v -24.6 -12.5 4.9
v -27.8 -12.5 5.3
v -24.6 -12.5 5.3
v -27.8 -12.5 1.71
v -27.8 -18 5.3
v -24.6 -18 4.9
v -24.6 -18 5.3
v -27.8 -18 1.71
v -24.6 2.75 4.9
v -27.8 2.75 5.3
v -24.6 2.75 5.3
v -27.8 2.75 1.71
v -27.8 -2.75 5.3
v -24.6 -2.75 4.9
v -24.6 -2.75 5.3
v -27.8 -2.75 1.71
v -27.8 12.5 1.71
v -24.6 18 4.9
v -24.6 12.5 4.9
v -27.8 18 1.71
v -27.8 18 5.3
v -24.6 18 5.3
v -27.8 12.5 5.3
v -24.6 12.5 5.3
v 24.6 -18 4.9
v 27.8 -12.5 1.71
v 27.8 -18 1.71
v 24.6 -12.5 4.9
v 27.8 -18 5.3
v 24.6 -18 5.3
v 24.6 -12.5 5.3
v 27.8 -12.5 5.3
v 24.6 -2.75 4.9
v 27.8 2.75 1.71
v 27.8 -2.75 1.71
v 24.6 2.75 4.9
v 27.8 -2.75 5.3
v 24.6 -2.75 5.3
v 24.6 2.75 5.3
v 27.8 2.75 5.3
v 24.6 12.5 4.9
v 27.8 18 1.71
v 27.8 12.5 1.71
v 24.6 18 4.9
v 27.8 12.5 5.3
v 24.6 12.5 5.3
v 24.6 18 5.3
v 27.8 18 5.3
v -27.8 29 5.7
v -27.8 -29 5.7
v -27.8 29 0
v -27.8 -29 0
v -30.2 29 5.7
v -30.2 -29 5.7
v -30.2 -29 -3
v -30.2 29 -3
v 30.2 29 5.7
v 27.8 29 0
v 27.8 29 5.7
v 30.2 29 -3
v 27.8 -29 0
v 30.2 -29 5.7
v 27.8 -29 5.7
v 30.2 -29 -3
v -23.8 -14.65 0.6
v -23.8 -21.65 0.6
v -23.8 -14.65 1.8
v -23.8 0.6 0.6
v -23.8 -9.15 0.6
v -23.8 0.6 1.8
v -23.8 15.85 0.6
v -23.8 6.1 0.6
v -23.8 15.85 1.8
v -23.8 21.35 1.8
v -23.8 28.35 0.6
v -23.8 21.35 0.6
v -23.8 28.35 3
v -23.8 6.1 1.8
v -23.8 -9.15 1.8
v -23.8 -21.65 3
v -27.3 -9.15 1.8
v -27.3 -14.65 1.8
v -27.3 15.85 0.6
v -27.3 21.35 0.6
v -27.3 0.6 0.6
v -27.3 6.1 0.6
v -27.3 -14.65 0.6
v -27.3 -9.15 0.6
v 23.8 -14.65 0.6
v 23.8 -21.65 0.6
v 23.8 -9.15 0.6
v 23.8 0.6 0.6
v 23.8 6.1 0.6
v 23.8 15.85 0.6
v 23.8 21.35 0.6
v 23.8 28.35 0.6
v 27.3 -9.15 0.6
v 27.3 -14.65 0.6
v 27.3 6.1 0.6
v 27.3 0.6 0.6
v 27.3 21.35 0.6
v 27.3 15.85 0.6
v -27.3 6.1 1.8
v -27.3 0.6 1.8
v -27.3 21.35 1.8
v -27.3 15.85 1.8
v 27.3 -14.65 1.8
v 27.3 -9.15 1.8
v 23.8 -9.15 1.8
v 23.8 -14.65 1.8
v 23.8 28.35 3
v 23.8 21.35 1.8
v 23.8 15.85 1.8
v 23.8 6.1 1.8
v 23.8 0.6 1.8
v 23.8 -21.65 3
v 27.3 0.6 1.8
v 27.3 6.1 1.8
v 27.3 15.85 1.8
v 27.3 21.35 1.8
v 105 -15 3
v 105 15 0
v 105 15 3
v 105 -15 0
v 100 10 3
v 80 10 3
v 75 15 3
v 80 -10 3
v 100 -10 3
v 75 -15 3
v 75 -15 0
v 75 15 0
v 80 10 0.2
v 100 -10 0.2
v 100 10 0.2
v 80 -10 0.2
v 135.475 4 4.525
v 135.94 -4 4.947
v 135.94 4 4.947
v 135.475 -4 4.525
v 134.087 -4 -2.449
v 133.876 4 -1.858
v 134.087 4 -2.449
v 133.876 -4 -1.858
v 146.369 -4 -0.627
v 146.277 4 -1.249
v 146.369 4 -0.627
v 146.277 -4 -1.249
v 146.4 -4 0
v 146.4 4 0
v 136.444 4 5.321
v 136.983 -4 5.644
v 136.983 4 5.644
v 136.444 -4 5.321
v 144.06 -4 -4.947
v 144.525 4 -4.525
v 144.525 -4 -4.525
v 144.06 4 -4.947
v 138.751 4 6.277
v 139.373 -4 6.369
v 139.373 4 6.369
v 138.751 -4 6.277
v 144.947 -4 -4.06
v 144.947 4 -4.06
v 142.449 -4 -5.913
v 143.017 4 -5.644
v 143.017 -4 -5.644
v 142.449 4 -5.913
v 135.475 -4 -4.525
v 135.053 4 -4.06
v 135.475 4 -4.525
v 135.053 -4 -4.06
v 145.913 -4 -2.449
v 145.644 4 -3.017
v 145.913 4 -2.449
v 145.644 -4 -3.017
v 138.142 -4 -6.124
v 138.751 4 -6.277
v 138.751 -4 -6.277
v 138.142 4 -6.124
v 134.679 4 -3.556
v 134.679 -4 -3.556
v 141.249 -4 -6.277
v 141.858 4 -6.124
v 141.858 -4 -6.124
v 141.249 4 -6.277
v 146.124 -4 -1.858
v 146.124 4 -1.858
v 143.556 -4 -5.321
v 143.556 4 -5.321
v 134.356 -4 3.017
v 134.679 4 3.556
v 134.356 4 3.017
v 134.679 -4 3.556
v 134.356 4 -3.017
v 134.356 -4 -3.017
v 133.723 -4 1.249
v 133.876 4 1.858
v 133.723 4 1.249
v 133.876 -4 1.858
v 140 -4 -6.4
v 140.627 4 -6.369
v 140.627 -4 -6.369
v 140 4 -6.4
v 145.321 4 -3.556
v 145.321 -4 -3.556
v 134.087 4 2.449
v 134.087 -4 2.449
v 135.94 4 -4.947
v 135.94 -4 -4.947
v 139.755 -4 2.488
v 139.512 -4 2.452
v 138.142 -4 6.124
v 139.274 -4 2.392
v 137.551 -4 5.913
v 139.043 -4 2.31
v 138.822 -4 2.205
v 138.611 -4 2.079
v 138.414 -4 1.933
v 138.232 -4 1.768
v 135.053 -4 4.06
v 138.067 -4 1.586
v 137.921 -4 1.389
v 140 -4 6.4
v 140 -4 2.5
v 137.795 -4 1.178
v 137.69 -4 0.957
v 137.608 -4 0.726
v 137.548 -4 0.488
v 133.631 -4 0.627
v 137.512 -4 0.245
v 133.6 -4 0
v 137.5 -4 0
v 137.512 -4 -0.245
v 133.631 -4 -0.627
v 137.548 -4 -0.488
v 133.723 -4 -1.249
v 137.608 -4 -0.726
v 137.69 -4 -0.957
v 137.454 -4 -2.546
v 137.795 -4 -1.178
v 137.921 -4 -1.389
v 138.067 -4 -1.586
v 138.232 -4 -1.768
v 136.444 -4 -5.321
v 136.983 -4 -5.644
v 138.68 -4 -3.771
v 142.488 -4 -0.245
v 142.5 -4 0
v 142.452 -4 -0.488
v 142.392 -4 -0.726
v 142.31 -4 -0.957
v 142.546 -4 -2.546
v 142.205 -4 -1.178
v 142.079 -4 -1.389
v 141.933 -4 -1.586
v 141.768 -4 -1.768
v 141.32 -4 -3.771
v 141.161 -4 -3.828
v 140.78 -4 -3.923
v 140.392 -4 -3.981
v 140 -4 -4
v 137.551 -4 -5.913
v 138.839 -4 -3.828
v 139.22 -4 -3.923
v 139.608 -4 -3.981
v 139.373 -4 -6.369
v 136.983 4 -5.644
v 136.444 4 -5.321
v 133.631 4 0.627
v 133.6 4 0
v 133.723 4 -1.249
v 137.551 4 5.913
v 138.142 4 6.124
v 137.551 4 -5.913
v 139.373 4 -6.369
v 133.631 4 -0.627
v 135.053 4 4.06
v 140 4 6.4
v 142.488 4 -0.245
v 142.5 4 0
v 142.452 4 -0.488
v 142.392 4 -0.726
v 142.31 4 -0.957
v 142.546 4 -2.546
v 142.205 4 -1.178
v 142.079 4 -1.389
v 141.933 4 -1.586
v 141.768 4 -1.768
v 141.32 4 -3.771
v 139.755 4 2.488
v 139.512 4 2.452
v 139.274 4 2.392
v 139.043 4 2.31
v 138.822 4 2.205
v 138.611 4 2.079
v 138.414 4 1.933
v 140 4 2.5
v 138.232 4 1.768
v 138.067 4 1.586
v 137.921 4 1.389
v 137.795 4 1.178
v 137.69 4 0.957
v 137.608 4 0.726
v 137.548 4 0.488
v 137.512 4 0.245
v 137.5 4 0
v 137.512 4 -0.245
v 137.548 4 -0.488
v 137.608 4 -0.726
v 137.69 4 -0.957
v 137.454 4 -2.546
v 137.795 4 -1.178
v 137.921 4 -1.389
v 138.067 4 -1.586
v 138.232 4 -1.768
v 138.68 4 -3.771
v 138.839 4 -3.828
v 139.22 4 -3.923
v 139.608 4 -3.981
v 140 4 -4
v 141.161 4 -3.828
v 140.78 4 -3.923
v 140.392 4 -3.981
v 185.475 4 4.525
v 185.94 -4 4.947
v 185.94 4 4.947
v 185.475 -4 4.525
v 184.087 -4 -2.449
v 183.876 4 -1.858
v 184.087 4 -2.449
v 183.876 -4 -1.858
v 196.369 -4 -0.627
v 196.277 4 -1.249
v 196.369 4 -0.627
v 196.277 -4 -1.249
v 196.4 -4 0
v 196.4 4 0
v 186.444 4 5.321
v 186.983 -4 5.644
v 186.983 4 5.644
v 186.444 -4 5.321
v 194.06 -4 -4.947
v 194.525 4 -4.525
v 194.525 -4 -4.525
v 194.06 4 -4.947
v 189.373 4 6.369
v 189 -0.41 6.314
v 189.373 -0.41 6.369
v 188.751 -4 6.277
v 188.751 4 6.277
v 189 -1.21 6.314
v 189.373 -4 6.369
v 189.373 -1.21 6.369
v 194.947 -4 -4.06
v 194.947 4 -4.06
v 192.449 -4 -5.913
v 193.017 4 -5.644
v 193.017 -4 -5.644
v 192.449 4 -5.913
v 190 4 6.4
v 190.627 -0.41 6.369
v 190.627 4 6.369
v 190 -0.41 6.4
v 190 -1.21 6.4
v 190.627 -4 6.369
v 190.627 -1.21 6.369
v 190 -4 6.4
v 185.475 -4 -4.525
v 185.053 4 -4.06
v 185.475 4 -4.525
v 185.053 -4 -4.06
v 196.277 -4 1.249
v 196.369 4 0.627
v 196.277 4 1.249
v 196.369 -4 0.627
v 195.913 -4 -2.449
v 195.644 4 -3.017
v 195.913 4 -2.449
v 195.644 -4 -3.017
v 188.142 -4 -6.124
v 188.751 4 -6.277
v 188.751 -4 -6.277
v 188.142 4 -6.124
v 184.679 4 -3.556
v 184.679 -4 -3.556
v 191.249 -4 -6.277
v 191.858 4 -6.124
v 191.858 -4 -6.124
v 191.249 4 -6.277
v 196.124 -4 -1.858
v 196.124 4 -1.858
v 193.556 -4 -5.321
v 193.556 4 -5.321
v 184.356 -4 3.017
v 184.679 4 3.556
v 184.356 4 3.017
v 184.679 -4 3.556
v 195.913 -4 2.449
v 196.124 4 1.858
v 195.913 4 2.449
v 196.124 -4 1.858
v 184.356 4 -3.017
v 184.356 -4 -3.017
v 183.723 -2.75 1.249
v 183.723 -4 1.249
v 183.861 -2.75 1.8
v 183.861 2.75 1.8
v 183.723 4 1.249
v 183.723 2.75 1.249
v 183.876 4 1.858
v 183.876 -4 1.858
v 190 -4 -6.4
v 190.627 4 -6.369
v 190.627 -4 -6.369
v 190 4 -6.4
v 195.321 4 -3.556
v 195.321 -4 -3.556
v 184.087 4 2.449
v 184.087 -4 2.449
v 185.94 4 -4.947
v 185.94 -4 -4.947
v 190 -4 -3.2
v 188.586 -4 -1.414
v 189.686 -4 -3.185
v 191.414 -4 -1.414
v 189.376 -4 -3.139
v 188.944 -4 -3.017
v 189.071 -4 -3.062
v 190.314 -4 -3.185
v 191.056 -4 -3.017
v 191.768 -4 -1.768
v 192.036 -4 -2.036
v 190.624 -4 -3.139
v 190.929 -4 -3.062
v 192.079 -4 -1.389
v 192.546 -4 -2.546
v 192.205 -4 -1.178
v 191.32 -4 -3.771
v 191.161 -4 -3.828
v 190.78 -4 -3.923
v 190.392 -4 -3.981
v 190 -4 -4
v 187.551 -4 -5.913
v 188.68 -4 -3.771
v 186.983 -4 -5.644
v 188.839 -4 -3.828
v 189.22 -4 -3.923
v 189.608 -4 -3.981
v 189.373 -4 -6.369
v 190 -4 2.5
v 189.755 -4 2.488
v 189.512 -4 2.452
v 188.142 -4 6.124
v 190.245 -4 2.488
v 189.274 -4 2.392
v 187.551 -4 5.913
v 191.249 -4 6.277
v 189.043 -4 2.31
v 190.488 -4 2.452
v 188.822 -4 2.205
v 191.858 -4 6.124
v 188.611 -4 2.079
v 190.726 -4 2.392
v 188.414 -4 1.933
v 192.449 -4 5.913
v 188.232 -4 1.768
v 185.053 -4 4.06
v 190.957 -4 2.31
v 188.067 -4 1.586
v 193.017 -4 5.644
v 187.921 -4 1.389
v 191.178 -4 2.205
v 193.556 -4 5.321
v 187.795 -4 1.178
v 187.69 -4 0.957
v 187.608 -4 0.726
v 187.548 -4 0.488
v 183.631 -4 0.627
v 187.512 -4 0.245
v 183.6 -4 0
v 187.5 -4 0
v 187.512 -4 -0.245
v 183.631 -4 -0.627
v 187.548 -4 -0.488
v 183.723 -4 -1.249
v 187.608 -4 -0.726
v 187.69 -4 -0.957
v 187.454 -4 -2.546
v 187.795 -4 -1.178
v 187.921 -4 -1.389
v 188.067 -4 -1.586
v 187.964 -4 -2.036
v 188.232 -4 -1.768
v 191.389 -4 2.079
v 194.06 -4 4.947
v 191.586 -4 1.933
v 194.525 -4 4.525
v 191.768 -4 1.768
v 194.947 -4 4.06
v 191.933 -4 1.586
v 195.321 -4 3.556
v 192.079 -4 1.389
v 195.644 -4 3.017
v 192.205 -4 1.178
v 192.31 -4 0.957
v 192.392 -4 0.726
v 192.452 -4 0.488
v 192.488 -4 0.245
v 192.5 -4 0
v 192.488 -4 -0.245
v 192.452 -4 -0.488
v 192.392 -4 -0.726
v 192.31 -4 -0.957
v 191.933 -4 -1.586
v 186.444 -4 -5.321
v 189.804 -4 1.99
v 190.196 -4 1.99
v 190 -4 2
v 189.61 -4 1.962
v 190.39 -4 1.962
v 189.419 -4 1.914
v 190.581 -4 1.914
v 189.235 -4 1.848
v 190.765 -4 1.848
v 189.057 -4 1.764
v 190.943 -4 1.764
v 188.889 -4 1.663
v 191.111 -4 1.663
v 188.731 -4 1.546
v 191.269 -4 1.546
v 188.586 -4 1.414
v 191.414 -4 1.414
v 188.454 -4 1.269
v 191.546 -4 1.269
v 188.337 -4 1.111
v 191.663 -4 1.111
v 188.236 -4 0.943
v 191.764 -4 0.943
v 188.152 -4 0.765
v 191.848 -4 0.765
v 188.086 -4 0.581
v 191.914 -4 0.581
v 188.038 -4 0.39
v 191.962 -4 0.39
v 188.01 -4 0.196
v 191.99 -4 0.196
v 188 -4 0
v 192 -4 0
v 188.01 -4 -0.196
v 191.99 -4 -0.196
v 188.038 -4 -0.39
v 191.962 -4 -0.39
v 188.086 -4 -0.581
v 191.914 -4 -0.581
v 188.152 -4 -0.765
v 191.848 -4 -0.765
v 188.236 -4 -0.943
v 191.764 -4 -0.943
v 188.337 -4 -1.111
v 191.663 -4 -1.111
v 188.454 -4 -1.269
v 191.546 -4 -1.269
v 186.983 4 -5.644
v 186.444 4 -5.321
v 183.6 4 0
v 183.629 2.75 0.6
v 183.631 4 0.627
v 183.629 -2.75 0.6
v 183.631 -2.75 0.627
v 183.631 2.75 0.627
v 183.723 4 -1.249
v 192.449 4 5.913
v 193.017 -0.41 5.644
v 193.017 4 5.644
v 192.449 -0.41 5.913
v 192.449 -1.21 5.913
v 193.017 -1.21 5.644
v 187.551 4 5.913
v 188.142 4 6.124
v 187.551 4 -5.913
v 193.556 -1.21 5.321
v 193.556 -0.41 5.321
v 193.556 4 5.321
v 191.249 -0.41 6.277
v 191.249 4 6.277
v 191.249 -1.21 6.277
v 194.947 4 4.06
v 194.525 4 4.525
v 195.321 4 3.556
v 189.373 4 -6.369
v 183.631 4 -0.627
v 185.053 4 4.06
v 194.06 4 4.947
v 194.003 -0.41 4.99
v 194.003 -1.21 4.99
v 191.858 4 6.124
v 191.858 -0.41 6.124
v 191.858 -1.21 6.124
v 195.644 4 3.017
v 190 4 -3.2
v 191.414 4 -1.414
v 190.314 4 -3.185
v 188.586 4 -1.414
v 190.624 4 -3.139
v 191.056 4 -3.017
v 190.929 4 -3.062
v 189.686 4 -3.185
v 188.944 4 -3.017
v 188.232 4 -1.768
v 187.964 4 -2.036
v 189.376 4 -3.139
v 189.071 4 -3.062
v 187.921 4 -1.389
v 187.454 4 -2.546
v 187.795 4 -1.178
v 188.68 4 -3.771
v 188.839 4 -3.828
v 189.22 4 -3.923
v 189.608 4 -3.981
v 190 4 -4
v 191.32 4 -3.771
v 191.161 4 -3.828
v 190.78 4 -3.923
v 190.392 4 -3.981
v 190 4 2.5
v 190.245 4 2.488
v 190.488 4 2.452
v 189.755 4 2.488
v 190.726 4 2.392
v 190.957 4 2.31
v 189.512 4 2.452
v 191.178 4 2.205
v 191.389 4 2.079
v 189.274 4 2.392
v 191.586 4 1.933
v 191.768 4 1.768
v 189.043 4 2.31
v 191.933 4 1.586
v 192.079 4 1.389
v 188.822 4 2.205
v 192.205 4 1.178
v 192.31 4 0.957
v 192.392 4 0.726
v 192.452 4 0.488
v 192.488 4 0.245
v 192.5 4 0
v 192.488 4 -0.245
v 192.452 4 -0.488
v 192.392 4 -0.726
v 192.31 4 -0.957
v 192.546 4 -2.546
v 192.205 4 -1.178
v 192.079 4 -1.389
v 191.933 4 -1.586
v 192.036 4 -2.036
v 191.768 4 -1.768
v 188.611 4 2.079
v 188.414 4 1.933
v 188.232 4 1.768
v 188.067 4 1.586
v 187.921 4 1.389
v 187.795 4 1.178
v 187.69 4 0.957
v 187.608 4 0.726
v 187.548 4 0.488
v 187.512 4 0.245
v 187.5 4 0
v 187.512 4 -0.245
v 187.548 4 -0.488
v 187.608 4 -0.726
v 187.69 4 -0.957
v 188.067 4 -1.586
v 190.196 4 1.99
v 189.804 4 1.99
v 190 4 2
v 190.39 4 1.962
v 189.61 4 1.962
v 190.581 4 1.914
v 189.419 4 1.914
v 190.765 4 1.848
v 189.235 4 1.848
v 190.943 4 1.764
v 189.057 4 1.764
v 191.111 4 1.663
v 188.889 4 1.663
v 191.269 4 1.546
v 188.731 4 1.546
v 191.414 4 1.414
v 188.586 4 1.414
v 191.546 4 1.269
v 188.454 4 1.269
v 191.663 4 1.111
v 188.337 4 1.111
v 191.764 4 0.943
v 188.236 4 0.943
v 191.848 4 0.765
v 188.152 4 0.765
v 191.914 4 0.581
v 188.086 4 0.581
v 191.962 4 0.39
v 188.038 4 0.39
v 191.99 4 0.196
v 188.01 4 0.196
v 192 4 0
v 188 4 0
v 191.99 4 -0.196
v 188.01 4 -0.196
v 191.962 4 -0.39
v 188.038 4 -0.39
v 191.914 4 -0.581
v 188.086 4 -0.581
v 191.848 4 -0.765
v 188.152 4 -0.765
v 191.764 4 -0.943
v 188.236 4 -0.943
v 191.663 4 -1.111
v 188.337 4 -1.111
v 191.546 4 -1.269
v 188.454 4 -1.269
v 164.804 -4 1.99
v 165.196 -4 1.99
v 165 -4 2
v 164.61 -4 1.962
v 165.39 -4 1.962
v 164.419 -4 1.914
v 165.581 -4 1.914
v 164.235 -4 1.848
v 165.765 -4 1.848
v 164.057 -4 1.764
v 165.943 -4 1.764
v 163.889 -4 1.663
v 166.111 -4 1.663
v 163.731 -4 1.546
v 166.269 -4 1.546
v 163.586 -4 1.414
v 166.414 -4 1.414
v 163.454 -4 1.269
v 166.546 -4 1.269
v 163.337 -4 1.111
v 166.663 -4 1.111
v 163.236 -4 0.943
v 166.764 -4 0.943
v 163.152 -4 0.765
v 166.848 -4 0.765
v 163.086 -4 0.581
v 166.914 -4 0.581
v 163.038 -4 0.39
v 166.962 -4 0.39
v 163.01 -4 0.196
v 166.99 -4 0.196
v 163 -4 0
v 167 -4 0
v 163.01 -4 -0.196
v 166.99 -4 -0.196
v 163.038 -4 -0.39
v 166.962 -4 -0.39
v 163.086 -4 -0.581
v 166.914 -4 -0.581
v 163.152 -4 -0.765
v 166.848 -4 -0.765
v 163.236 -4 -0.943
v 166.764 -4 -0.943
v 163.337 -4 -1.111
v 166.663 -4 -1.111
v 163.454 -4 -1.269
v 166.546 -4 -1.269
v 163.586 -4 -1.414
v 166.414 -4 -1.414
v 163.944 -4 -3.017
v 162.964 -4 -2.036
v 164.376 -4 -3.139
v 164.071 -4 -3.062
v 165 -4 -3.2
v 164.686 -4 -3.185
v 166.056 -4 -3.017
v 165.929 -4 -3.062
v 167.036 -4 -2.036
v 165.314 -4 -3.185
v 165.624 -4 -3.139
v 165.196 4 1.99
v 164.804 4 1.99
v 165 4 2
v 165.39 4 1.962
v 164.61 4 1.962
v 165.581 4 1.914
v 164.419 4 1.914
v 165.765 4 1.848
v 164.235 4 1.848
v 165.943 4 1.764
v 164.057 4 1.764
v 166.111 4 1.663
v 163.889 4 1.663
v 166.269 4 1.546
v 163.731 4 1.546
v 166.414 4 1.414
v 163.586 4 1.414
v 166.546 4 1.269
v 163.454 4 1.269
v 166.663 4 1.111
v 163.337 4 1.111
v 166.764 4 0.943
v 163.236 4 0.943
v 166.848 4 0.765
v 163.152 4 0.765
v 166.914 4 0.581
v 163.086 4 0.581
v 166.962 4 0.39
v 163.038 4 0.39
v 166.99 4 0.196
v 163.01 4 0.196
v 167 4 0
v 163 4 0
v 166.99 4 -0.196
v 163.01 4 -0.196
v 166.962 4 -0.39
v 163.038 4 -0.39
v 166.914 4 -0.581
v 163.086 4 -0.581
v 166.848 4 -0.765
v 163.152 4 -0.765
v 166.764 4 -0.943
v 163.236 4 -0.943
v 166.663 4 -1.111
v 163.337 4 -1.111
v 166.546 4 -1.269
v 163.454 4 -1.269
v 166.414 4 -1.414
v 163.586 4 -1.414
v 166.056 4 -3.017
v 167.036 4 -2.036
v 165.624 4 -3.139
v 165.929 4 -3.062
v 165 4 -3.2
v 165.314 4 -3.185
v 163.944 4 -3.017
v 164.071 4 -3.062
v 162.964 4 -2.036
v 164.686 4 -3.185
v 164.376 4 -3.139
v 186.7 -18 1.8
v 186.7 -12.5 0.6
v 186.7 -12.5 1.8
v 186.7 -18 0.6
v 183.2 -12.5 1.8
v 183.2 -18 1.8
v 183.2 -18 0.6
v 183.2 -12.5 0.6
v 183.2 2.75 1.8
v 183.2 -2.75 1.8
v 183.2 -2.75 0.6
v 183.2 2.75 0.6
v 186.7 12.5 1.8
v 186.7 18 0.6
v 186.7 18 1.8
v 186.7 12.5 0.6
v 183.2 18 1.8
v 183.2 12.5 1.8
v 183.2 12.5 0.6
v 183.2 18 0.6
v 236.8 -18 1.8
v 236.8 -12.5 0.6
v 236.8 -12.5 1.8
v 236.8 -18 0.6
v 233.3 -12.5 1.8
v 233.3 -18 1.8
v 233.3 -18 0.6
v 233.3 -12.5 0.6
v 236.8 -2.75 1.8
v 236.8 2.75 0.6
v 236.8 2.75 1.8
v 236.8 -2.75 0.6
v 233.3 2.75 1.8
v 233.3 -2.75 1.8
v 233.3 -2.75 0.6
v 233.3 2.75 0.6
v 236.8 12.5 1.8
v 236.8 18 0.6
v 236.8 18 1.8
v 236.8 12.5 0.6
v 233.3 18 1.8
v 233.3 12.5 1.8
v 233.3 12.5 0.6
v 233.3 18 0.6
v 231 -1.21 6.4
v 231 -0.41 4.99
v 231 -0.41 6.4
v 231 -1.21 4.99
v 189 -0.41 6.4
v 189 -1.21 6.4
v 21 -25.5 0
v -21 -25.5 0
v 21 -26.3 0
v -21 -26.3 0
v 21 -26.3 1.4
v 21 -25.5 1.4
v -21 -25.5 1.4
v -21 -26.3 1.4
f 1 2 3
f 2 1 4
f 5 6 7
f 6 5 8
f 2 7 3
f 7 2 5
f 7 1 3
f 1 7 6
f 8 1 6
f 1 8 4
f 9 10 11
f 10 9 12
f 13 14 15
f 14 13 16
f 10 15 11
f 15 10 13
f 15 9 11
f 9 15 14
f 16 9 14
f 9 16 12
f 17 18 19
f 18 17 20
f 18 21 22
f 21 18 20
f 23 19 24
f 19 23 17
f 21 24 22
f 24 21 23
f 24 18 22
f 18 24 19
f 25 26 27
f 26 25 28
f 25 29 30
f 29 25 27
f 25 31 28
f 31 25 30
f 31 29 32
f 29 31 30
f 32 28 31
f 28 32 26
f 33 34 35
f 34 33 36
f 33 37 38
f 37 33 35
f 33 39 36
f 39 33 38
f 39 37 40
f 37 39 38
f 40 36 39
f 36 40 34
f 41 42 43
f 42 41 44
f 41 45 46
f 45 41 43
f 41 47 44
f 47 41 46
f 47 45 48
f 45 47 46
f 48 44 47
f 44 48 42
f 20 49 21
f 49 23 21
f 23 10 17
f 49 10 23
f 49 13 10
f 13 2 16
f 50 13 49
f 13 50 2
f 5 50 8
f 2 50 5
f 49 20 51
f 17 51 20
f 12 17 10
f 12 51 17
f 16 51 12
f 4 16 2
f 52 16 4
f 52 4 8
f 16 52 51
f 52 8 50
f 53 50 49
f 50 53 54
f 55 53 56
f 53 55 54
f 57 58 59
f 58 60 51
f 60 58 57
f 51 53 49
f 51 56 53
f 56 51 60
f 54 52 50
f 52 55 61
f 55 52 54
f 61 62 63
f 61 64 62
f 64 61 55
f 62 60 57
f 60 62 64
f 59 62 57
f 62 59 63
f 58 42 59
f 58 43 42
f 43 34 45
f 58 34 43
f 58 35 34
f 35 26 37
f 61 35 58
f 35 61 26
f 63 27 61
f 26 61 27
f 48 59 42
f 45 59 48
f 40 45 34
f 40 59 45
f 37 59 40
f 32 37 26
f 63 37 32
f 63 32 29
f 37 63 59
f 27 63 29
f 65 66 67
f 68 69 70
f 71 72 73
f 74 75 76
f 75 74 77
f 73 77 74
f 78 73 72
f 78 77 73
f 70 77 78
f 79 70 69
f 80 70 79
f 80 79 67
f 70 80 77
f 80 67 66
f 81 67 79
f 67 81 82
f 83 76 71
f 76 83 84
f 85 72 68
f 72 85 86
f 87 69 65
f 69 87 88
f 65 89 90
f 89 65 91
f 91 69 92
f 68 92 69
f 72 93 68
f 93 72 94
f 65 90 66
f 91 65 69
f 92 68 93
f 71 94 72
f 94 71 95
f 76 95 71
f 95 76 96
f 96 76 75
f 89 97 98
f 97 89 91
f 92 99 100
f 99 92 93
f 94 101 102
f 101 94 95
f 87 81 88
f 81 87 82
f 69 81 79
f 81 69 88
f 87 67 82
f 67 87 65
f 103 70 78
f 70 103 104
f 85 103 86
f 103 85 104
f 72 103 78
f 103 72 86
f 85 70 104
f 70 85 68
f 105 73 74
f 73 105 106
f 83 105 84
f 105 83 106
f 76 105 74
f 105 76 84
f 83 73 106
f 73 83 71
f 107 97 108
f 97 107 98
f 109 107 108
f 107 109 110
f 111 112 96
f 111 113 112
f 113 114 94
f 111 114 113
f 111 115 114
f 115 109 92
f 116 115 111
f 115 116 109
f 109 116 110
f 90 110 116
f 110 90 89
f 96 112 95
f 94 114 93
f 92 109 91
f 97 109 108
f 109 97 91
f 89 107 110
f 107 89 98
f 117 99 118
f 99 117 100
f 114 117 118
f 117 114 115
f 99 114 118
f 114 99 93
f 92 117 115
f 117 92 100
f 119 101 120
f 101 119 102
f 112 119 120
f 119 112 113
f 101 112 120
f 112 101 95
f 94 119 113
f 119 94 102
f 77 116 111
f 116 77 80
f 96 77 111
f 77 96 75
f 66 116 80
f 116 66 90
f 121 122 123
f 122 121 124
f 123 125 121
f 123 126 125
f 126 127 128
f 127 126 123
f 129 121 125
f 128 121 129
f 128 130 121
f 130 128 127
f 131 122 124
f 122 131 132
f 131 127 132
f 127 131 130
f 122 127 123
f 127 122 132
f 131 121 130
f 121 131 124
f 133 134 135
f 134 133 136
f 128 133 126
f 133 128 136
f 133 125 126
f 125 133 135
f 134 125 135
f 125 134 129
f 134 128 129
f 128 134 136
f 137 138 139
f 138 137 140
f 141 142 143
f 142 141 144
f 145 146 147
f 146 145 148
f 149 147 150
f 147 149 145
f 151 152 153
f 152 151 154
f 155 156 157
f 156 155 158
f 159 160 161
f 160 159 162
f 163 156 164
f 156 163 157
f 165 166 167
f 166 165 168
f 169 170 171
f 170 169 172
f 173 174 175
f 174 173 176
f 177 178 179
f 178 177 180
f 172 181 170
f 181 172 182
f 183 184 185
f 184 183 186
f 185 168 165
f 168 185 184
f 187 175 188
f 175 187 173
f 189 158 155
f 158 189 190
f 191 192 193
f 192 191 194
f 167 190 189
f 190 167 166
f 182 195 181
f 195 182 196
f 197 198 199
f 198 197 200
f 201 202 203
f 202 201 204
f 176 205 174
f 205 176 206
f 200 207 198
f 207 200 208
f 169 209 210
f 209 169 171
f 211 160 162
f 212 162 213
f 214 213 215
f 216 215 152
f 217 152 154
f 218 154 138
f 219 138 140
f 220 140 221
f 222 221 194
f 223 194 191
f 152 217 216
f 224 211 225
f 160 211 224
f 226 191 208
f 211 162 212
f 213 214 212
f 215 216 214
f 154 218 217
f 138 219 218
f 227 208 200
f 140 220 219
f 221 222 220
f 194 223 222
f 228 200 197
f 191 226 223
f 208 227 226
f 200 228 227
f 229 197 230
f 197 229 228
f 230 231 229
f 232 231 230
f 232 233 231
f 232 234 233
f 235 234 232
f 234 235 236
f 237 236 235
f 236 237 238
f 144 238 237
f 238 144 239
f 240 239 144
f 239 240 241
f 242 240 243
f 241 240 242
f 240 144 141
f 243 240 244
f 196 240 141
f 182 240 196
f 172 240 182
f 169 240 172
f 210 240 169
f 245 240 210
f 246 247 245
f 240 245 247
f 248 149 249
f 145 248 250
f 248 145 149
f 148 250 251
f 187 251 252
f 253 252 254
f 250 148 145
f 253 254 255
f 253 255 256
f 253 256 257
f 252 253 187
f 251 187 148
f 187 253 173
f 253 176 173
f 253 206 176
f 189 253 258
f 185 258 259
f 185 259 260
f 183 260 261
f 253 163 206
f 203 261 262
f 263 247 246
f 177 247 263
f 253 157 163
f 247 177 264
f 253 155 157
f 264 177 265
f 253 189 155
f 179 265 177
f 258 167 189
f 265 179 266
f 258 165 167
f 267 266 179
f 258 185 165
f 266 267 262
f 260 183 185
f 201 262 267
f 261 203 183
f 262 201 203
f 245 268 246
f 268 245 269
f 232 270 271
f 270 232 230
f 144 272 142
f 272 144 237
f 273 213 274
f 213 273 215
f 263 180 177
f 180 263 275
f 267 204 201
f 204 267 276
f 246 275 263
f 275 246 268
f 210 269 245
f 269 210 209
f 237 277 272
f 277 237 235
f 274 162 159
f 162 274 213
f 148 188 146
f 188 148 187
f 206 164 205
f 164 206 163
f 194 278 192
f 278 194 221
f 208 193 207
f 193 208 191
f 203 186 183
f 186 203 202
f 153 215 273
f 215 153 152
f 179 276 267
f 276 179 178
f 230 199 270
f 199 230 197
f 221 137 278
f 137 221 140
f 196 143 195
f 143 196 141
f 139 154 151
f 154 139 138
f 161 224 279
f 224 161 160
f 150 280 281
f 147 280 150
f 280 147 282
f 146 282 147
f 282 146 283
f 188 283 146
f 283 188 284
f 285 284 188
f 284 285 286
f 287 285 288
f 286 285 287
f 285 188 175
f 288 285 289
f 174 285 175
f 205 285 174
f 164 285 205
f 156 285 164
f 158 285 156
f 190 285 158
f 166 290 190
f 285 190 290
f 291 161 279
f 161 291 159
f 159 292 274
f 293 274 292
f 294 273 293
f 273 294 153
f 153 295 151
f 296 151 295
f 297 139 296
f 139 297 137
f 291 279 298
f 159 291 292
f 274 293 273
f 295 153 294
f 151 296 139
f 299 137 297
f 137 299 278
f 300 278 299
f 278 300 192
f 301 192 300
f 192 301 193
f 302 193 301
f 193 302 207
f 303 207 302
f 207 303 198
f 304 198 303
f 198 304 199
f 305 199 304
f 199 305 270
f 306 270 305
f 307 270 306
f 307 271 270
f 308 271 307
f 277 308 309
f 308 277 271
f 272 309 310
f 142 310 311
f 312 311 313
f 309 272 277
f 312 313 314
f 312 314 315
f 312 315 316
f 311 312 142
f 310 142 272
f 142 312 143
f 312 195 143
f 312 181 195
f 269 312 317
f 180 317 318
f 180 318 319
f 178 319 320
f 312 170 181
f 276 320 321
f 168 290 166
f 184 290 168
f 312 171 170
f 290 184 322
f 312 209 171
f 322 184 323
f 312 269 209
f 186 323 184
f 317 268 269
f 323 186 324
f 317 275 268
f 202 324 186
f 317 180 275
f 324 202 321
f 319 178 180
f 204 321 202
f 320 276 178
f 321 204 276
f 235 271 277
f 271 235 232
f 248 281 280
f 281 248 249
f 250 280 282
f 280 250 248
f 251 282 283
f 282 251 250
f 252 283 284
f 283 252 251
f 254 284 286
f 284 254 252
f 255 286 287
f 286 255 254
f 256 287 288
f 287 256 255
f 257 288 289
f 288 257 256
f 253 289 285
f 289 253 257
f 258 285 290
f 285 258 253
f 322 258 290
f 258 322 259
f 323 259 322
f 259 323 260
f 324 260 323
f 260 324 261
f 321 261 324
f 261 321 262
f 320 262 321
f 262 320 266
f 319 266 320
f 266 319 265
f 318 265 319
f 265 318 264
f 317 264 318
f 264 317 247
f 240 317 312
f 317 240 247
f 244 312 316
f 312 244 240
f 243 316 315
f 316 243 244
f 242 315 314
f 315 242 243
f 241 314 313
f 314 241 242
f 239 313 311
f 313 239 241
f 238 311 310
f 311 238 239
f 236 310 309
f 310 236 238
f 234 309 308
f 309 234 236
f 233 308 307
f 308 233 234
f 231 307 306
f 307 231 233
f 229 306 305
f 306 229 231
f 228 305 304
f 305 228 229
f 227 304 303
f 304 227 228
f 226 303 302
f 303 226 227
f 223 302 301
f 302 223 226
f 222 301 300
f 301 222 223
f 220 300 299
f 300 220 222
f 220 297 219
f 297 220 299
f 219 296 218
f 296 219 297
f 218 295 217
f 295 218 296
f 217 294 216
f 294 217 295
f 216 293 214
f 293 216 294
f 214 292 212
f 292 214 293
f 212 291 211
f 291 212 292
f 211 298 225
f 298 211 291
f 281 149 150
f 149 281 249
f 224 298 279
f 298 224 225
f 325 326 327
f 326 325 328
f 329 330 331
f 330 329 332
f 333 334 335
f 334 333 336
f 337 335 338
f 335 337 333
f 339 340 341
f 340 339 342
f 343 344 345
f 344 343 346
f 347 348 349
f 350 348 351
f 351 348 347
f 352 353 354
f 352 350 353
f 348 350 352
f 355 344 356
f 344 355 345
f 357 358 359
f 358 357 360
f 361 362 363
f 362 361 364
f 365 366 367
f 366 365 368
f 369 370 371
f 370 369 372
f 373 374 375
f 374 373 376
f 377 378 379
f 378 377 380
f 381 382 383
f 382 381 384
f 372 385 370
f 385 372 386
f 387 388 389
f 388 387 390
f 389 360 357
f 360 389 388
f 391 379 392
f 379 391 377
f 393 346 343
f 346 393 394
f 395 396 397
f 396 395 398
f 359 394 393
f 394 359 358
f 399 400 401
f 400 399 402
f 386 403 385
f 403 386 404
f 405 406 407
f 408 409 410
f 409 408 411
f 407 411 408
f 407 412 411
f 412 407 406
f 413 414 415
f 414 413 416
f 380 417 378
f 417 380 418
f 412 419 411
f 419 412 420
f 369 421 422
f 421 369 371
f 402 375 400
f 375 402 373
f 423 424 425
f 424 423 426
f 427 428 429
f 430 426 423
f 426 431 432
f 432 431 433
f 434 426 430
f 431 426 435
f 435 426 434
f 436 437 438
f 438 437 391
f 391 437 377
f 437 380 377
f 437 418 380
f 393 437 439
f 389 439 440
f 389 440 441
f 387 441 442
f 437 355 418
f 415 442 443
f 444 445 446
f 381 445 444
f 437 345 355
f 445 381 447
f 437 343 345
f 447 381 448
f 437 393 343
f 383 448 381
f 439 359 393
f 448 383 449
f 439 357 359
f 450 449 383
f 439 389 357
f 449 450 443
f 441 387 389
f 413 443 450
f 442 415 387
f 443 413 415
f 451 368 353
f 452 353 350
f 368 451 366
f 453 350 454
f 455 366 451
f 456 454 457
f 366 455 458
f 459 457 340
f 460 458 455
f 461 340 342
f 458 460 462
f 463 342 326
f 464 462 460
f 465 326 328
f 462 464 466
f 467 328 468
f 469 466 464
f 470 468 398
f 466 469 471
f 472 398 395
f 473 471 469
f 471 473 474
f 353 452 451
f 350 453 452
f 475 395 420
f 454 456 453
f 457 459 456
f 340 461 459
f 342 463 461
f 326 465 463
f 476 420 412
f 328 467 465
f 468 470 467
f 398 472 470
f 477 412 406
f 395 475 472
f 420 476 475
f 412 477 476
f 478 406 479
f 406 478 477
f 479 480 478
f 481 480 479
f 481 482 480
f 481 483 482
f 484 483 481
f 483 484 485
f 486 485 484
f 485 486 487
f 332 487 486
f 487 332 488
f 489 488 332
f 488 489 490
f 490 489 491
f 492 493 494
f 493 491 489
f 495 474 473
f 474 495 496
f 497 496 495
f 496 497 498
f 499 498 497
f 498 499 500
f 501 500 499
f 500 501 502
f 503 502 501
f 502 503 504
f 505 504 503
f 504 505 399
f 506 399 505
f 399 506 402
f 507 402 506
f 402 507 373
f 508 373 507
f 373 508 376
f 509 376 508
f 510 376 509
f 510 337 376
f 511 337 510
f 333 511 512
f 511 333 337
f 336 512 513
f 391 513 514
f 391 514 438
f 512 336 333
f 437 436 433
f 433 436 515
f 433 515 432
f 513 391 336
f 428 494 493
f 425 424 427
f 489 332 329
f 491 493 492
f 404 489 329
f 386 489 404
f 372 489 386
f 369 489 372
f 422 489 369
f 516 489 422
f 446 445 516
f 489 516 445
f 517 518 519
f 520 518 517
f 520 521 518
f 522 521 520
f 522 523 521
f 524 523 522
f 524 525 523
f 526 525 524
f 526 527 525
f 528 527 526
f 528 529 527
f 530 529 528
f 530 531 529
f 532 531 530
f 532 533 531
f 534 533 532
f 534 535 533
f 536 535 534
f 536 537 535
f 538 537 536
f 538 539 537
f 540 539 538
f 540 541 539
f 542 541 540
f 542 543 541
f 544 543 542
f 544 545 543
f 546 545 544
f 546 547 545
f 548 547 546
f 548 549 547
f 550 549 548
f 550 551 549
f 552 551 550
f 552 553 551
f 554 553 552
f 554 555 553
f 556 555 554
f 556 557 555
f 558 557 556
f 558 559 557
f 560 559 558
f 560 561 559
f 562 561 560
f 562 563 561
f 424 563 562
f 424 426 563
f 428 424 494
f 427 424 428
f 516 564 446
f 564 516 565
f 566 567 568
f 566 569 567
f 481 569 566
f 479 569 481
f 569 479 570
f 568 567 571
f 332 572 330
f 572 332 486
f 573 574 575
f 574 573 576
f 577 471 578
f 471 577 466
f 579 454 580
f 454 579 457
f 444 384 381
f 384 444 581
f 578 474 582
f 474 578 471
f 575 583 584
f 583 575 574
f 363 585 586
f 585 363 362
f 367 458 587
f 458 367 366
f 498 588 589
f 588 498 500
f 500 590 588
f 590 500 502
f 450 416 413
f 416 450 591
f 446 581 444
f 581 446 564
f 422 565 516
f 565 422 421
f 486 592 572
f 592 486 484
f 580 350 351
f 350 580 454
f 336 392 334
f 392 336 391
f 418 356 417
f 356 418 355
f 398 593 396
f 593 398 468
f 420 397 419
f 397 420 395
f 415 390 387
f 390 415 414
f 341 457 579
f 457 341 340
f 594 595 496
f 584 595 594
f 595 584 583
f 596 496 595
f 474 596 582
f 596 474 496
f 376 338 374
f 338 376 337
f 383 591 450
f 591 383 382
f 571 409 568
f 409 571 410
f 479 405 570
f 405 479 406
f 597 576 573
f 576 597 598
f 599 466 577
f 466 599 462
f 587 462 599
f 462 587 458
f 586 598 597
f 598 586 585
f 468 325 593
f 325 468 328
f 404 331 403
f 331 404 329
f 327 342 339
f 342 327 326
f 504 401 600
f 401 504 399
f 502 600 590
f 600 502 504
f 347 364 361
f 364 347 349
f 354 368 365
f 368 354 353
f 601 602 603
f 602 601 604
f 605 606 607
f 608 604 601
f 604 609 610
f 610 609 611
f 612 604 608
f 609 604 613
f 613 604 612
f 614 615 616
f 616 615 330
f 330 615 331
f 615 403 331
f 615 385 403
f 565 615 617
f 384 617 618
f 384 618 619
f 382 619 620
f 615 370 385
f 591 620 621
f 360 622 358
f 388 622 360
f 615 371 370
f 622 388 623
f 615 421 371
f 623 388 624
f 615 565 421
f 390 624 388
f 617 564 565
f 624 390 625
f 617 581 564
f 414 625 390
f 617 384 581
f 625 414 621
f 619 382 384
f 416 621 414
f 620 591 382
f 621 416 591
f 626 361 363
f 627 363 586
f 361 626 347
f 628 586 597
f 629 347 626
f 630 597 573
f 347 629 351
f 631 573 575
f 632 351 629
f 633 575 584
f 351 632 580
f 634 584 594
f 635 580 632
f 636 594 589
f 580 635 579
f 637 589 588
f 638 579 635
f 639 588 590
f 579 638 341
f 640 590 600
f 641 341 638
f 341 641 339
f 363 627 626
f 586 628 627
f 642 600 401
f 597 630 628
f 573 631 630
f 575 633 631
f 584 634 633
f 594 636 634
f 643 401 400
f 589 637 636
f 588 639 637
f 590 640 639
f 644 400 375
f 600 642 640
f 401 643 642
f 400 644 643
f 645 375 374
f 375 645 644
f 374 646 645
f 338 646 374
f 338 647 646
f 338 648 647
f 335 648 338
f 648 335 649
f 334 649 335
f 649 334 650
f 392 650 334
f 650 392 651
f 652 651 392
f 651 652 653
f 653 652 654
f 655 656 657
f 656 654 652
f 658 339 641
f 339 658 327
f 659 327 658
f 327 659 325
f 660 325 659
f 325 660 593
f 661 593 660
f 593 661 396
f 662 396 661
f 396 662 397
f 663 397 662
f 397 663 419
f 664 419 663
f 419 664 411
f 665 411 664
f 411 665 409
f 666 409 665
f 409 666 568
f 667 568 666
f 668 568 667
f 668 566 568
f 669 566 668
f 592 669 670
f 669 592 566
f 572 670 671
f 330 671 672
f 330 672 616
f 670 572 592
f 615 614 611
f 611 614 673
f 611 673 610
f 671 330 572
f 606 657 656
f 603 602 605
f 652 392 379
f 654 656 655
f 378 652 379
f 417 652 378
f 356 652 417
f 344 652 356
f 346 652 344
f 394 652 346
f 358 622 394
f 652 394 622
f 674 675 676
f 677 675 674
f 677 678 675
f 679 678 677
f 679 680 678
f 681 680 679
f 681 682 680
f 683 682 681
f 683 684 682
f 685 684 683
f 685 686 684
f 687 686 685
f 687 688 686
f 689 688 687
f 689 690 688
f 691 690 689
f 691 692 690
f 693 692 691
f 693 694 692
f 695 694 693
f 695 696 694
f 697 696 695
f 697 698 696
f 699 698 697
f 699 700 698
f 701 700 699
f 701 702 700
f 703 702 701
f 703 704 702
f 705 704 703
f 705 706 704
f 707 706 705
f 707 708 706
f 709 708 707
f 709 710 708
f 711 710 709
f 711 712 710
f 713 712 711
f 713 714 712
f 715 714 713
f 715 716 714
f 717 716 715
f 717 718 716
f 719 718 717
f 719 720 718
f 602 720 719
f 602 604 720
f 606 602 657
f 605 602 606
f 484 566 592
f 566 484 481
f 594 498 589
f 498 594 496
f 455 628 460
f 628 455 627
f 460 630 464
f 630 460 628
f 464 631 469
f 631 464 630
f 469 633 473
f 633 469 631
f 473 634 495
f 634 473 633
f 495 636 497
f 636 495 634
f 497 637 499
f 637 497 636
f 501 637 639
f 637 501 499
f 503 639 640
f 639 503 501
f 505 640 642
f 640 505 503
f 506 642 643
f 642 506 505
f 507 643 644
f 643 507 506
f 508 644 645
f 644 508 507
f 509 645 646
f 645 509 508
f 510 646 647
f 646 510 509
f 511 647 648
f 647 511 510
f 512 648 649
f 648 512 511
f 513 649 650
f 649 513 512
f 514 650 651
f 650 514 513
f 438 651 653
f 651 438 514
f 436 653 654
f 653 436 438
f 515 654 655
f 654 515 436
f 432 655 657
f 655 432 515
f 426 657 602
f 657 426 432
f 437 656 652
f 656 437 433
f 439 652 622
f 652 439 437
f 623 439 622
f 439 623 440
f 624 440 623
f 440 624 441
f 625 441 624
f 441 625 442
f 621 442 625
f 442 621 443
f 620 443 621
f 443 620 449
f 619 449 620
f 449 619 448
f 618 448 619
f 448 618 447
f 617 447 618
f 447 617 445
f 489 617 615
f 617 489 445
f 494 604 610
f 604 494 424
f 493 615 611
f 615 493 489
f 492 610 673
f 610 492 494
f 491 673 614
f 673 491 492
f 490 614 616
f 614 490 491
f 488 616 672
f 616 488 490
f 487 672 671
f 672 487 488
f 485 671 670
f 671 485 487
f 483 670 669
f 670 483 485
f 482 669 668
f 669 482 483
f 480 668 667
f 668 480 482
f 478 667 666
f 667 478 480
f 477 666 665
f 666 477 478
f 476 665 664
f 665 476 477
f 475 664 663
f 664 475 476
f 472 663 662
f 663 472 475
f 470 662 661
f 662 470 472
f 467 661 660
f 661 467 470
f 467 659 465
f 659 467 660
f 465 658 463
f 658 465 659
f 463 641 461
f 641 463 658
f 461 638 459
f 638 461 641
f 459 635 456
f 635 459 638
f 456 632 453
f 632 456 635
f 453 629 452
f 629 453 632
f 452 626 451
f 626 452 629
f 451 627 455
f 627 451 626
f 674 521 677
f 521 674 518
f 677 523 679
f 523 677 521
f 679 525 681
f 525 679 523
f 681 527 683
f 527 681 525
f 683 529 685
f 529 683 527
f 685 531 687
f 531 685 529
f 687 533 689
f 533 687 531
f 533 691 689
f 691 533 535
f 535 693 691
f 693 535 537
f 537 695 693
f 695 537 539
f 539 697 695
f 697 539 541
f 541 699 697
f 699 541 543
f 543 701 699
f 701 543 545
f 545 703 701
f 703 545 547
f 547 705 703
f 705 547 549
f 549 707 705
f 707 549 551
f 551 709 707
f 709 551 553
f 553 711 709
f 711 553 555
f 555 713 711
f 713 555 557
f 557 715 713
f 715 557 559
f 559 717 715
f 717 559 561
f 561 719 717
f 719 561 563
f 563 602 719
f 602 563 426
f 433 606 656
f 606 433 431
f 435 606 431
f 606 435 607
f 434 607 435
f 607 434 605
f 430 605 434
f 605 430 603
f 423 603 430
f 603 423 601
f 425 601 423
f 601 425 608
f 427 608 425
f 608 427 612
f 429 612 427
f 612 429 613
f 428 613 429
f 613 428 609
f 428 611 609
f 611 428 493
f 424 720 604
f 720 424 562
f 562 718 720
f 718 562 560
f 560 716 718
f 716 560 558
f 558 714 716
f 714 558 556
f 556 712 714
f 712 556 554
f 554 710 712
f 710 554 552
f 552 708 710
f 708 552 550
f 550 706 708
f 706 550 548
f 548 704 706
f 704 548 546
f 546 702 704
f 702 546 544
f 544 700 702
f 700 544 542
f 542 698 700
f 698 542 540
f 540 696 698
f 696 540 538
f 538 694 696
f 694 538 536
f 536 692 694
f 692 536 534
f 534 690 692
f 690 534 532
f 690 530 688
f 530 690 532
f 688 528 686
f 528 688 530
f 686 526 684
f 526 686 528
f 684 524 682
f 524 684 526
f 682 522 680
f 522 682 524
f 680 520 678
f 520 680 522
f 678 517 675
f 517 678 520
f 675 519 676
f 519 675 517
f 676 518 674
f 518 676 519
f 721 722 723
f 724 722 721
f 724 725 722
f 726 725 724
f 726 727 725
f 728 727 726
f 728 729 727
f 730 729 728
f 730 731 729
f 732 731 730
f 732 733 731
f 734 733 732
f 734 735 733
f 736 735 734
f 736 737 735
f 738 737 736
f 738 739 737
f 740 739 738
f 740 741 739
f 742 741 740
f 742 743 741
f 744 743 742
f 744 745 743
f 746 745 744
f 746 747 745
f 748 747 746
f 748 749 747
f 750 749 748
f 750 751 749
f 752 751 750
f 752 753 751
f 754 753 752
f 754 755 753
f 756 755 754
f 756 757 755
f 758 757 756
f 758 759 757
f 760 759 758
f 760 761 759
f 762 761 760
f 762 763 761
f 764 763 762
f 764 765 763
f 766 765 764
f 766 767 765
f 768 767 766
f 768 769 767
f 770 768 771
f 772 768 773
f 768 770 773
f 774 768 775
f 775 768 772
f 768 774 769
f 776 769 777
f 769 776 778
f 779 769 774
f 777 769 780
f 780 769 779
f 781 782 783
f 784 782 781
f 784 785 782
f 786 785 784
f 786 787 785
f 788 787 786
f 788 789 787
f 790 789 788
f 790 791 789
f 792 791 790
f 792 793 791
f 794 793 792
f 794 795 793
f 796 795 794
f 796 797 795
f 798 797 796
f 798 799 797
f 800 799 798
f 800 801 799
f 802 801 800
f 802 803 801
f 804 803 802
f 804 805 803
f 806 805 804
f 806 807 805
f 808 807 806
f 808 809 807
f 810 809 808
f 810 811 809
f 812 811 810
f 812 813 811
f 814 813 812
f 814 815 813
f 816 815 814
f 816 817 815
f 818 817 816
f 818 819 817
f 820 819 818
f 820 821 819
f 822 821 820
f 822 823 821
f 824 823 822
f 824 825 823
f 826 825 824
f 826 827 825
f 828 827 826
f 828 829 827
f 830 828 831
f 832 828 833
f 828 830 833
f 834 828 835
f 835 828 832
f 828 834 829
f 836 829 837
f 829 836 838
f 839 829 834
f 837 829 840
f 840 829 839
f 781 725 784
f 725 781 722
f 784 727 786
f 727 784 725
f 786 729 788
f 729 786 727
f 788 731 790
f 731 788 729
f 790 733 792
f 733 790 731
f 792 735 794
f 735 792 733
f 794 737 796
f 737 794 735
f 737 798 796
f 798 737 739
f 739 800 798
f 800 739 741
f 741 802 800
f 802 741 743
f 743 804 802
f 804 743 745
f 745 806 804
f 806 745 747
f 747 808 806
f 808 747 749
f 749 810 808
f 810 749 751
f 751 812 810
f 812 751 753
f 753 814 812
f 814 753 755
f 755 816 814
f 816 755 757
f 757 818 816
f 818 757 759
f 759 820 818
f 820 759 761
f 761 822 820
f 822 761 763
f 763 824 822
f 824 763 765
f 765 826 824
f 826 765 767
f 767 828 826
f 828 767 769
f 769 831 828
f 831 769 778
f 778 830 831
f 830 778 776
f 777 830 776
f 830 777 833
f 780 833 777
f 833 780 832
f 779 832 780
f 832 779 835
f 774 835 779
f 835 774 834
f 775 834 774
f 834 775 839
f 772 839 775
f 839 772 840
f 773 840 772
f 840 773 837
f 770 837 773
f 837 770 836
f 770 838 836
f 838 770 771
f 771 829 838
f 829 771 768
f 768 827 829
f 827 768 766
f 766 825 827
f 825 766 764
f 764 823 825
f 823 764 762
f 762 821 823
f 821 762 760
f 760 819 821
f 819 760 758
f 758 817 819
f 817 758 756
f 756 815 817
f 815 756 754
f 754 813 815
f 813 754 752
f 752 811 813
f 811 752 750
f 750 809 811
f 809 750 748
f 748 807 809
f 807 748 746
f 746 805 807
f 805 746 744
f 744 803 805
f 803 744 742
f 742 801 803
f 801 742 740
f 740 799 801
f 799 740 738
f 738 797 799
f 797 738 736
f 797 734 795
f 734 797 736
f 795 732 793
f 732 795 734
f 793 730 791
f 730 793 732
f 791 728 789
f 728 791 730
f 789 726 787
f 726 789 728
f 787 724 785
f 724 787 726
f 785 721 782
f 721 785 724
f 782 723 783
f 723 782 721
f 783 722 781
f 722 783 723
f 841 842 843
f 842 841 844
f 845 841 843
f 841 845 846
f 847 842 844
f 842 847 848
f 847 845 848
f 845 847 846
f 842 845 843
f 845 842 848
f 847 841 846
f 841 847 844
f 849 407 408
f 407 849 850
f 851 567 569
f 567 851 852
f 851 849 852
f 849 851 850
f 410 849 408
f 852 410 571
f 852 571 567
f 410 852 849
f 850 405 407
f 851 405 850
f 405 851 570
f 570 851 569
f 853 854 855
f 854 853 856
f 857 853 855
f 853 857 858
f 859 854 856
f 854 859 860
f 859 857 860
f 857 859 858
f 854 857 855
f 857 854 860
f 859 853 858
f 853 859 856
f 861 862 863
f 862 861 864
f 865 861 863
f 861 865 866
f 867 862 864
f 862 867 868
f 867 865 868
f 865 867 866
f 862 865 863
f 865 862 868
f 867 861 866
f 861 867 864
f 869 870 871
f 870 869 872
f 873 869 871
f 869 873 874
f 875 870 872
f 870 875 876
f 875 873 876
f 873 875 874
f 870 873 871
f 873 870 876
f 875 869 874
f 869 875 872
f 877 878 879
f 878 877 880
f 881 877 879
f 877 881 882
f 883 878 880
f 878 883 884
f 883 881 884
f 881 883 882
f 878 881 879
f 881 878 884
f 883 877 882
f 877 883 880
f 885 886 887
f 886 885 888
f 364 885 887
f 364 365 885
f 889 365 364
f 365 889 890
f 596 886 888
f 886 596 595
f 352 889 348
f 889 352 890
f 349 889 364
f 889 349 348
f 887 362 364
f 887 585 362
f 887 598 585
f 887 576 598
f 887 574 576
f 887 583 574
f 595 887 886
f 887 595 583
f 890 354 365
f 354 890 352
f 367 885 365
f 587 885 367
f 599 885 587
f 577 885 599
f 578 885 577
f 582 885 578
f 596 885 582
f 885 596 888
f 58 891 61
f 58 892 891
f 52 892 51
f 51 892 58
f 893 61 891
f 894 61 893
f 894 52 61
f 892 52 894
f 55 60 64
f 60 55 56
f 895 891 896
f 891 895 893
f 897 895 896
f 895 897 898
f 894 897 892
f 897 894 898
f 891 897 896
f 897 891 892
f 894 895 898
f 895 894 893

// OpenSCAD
// file: printability.scad
// printability.scad — small FDM-focused helpers shared across designs.
// All dimensions in millimeters. Use from a design with:
//   use <../../lib/printability.scad>
// These are deliberately lightweight (no BOSL2 dependency, fast to render).
// For fillets, real threads, attachments, etc. use BOSL2: include <BOSL2/std.scad>

// ---------------------------------------------------------------------------
// Metric fastener presets
// ---------------------------------------------------------------------------

// Clearance hole diameter ("normal" fit, ISO 273) — already includes clearance,
// no extra tolerance needed for FDM at typical accuracy.
function screw_clearance_d(size) =
    size == "M2"   ? 2.4 :
    size == "M2.5" ? 2.9 :
    size == "M3"   ? 3.4 :
    size == "M4"   ? 4.5 :
    size == "M5"   ? 5.5 :
    size == "M6"   ? 6.6 :
    assert(false, str("unknown screw size: ", size));

// Socket-cap head: [head diameter incl. 0.5 clearance, head height]
function socket_head(size) =
    size == "M2"   ? [4.3, 2.0] :
    size == "M2.5" ? [5.0, 2.5] :
    size == "M3"   ? [6.0, 3.0] :
    size == "M4"   ? [7.5, 4.0] :
    size == "M5"   ? [9.0, 5.0] :
    size == "M6"   ? [10.5, 6.0] :
    assert(false, str("unknown screw size: ", size));

// Heat-set insert hole diameter (typical brass inserts for plastic)
function heatset_hole_d(size) =
    size == "M2"   ? 3.2 :
    size == "M2.5" ? 3.6 :
    size == "M3"   ? 4.0 :
    size == "M4"   ? 5.6 :
    size == "M5"   ? 6.4 :
    assert(false, str("unknown insert size: ", size));

// ---------------------------------------------------------------------------
// Cutters (use inside difference()). All extend 0.01 past faces to avoid
// zero-thickness walls / z-fighting.
// ---------------------------------------------------------------------------

// Vertical clearance hole for a metric screw, optionally with a recessed head.
// l      — material thickness the hole passes through (hole spans z = 0..l)
// head   — "none" | "socket" (counterbore) | "countersunk" (90° csk)
// head_depth — counterbore depth; default = head height preset
module screw_hole(size = "M3", l = 10, head = "none", head_depth = undef) {
    d = screw_clearance_d(size);
    translate([0, 0, -0.01]) cylinder(d = d, h = l + 0.02);
    if (head == "socket") {
        hd = socket_head(size);
        depth = head_depth == undef ? hd[1] : head_depth;
        translate([0, 0, l - depth]) cylinder(d = hd[0], h = depth + 0.01);
    } else if (head == "countersunk") {
        ch = d; // 90° countersink: depth == radius growth
        translate([0, 0, l - ch]) cylinder(d1 = d, d2 = d + 2 * ch, h = ch + 0.01);
    }
}

// Teardrop-profile horizontal hole: prints without supports when the axis is
// horizontal. Axis along Y; the point of the teardrop faces +Z.
module teardrop_hole(d = 5, l = 10) {
    rotate([-90, 0, 0]) linear_extrude(l, center = true) {
        circle(d = d);
        // 45° roof so the top bridges cleanly
        intersection() {
            rotate(45) square(d * 0.72, center = false);
            circle(d = d * 1.6);
        }
    }
}

// ---------------------------------------------------------------------------
// Solids
// ---------------------------------------------------------------------------

// Boss for a heat-set insert: solid cylinder with the insert hole pre-cut.
// h — boss height; insert hole depth = insert length + 1 (pass insert_l).
module heatset_boss(size = "M3", h = 8, wall = 2.4, insert_l = 5) {
    hole_d = heatset_hole_d(size);
    difference() {
        cylinder(d = hole_d + 2 * wall, h = h);
        translate([0, 0, h - insert_l - 1]) cylinder(d = hole_d, h = insert_l + 1.01);
    }
}

// Cylinder with 45° chamfers so it prints cleanly and assembles easily.
// chamfer1/chamfer2 — bottom/top chamfer size (0 to disable either).
module chamfered_cylinder(d = 10, h = 10, chamfer1 = 0.6, chamfer2 = 0.6) {
    union() {
        if (chamfer1 > 0)
            cylinder(d1 = d - 2 * chamfer1, d2 = d, h = chamfer1);
        translate([0, 0, chamfer1])
            cylinder(d = d, h = h - chamfer1 - chamfer2);
        if (chamfer2 > 0)
            translate([0, 0, h - chamfer2])
                cylinder(d1 = d, d2 = d - 2 * chamfer2, h = chamfer2);
    }
}

// Box with rounded vertical edges and a chamfered bottom edge — the standard
// "sits nicely on the print bed" enclosure base shape.
module rounded_box(size = [40, 30, 15], r = 3, bottom_chamfer = 0.6) {
    hull() {
        for (x = [r, size[0] - r], y = [r, size[1] - r]) {
            translate([x, y, bottom_chamfer])
                cylinder(r = r, h = size[2] - bottom_chamfer);
            if (bottom_chamfer > 0)
                translate([x, y, 0])
                    cylinder(r1 = r - bottom_chamfer, r2 = r, h = bottom_chamfer);
        }
    }
}
// main file
// Exercises every module in print-in-place.scad — check.sh CGAL-renders this
// on every run, so it is the library's geometry regression test (guards have
// their own negative suite in print-in-place-guards.conf, and the tab/lip and
// hinge FITS are measured on exported meshes in print-in-place-mates.conf —
// a render cannot measure itself, issue #37).
use <print-in-place.scad>

// The hinge's teardrop bore is the library's one curved surface and is
// $fn-sensitive; everything else is polyhedral. Production-quality per
// CLAUDE.md's visible-cylinder floor.
$fn = 64;

// ---------------------------------------------------------------------------
// Station 1: reference bay at the battleship's exact one-cell numbers
// (window 46 -> pitch 58, door 47.6 x 50, travel 6.7). A change that would
// have altered the frozen design's mechanism shows up here first. The wall
// and plate are caller-owned (see slide_rail's doc): the wall is sized by
// pip_rail_h() and buried eps into the plate, the same relationships the
// battleship uses — they are load-bearing mesh hygiene (a kiss contact is
// fused by CGAL but shipped by Manifold as a separate shell).
// ---------------------------------------------------------------------------
pitch = 58; opening = 46; rail_w = 2.4; plate_t = 3;
door_w = 47.6; door_l = 50; door_t = 2.4; gap_z = 0.6;
travel = 6.7;
rh = pip_rail_h();                 // 5.7 at the battleship defaults
wall_in = pitch/2 - rail_w/2;      // the rail wall's cell-side face

{
    // plate patch (top at z = 0, the slide_rail/end_stop origin plane)
    translate([-(wall_in + rail_w), -pitch/2, -plate_t])
        cube([2*(wall_in + rail_w), pitch, plate_t]);
    for (s = [-1, 1]) {
        // caller-owned rail wall, pip_rail_h() tall, eps-buried into the plate
        translate([s == 1 ? wall_in : -(wall_in + rail_w), -pitch/2, -0.01])
            cube([rail_w, pitch, rh + 0.01]);
        translate([s*wall_in, 0, 0])
            slide_rail(travel, side = s);
    }
    // end stop, gap-clear of the closed door's rear face
    translate([0, -door_l/2, 0])
        end_stop(door_w);
    // the door, posed mid-slide: body + tabs (tabs under lips, lifted-out
    // clearances visible in section)
    translate([0, travel/2, 0]) {
        translate([-door_w/2, -door_l/2, gap_z])
            cube([door_w, door_l, door_t]);
        slide_tab(door_w);
    }
}

// ---------------------------------------------------------------------------
// Station 2: sacrificial membrane worked example — the module is the WINDOW
// CUTTER, and the membrane is what it spares below z = h.
// ---------------------------------------------------------------------------
translate([90, 0, 0])
    difference() {
        translate([-15, -15, 0]) cube([30, 30, 3]);
        sacrificial_membrane(h = 0.2, cut_h = 3)
            square(20, center = true);
    }

// ---------------------------------------------------------------------------
// Station 3: hinge — quadrant-cut knuckle (teardrop bore profile visible),
// the matching pin, and the pair assembled (pin captive in the bore, 0.5 mm
// radial clearance; the fit itself is measured in print-in-place-mates.conf).
// ---------------------------------------------------------------------------
translate([140, 0, 0]) {
    difference() {
        pip_hinge();
        translate([0, -10, 0]) cube([20, 20, 20]);
    }
    translate([25, 0, 0]) pip_hinge_pin();
    translate([50, 0, 0]) { pip_hinge(); pip_hinge_pin(); }
}

// ---------------------------------------------------------------------------
// Station 4: boundary-accepting renders — the accepting halves of the range
// guards, which a guards manifest (refusals only) cannot express: the
// loosest legal door fit, and an end-stop gap just above the weld floor.
// ---------------------------------------------------------------------------
translate([210, 0, 0]) {
    slide_tab(door_w, fit = 0.5);
    translate([0, 0, 5]) end_stop(door_w, gap = 0.41);
}

echo(str("pip_lip_z() = ", pip_lip_z(),
         " mm — the tab/lip fit is verified on the exported mesh in ",
         "print-in-place-mates.conf, not by this echo (issue #37)"));
